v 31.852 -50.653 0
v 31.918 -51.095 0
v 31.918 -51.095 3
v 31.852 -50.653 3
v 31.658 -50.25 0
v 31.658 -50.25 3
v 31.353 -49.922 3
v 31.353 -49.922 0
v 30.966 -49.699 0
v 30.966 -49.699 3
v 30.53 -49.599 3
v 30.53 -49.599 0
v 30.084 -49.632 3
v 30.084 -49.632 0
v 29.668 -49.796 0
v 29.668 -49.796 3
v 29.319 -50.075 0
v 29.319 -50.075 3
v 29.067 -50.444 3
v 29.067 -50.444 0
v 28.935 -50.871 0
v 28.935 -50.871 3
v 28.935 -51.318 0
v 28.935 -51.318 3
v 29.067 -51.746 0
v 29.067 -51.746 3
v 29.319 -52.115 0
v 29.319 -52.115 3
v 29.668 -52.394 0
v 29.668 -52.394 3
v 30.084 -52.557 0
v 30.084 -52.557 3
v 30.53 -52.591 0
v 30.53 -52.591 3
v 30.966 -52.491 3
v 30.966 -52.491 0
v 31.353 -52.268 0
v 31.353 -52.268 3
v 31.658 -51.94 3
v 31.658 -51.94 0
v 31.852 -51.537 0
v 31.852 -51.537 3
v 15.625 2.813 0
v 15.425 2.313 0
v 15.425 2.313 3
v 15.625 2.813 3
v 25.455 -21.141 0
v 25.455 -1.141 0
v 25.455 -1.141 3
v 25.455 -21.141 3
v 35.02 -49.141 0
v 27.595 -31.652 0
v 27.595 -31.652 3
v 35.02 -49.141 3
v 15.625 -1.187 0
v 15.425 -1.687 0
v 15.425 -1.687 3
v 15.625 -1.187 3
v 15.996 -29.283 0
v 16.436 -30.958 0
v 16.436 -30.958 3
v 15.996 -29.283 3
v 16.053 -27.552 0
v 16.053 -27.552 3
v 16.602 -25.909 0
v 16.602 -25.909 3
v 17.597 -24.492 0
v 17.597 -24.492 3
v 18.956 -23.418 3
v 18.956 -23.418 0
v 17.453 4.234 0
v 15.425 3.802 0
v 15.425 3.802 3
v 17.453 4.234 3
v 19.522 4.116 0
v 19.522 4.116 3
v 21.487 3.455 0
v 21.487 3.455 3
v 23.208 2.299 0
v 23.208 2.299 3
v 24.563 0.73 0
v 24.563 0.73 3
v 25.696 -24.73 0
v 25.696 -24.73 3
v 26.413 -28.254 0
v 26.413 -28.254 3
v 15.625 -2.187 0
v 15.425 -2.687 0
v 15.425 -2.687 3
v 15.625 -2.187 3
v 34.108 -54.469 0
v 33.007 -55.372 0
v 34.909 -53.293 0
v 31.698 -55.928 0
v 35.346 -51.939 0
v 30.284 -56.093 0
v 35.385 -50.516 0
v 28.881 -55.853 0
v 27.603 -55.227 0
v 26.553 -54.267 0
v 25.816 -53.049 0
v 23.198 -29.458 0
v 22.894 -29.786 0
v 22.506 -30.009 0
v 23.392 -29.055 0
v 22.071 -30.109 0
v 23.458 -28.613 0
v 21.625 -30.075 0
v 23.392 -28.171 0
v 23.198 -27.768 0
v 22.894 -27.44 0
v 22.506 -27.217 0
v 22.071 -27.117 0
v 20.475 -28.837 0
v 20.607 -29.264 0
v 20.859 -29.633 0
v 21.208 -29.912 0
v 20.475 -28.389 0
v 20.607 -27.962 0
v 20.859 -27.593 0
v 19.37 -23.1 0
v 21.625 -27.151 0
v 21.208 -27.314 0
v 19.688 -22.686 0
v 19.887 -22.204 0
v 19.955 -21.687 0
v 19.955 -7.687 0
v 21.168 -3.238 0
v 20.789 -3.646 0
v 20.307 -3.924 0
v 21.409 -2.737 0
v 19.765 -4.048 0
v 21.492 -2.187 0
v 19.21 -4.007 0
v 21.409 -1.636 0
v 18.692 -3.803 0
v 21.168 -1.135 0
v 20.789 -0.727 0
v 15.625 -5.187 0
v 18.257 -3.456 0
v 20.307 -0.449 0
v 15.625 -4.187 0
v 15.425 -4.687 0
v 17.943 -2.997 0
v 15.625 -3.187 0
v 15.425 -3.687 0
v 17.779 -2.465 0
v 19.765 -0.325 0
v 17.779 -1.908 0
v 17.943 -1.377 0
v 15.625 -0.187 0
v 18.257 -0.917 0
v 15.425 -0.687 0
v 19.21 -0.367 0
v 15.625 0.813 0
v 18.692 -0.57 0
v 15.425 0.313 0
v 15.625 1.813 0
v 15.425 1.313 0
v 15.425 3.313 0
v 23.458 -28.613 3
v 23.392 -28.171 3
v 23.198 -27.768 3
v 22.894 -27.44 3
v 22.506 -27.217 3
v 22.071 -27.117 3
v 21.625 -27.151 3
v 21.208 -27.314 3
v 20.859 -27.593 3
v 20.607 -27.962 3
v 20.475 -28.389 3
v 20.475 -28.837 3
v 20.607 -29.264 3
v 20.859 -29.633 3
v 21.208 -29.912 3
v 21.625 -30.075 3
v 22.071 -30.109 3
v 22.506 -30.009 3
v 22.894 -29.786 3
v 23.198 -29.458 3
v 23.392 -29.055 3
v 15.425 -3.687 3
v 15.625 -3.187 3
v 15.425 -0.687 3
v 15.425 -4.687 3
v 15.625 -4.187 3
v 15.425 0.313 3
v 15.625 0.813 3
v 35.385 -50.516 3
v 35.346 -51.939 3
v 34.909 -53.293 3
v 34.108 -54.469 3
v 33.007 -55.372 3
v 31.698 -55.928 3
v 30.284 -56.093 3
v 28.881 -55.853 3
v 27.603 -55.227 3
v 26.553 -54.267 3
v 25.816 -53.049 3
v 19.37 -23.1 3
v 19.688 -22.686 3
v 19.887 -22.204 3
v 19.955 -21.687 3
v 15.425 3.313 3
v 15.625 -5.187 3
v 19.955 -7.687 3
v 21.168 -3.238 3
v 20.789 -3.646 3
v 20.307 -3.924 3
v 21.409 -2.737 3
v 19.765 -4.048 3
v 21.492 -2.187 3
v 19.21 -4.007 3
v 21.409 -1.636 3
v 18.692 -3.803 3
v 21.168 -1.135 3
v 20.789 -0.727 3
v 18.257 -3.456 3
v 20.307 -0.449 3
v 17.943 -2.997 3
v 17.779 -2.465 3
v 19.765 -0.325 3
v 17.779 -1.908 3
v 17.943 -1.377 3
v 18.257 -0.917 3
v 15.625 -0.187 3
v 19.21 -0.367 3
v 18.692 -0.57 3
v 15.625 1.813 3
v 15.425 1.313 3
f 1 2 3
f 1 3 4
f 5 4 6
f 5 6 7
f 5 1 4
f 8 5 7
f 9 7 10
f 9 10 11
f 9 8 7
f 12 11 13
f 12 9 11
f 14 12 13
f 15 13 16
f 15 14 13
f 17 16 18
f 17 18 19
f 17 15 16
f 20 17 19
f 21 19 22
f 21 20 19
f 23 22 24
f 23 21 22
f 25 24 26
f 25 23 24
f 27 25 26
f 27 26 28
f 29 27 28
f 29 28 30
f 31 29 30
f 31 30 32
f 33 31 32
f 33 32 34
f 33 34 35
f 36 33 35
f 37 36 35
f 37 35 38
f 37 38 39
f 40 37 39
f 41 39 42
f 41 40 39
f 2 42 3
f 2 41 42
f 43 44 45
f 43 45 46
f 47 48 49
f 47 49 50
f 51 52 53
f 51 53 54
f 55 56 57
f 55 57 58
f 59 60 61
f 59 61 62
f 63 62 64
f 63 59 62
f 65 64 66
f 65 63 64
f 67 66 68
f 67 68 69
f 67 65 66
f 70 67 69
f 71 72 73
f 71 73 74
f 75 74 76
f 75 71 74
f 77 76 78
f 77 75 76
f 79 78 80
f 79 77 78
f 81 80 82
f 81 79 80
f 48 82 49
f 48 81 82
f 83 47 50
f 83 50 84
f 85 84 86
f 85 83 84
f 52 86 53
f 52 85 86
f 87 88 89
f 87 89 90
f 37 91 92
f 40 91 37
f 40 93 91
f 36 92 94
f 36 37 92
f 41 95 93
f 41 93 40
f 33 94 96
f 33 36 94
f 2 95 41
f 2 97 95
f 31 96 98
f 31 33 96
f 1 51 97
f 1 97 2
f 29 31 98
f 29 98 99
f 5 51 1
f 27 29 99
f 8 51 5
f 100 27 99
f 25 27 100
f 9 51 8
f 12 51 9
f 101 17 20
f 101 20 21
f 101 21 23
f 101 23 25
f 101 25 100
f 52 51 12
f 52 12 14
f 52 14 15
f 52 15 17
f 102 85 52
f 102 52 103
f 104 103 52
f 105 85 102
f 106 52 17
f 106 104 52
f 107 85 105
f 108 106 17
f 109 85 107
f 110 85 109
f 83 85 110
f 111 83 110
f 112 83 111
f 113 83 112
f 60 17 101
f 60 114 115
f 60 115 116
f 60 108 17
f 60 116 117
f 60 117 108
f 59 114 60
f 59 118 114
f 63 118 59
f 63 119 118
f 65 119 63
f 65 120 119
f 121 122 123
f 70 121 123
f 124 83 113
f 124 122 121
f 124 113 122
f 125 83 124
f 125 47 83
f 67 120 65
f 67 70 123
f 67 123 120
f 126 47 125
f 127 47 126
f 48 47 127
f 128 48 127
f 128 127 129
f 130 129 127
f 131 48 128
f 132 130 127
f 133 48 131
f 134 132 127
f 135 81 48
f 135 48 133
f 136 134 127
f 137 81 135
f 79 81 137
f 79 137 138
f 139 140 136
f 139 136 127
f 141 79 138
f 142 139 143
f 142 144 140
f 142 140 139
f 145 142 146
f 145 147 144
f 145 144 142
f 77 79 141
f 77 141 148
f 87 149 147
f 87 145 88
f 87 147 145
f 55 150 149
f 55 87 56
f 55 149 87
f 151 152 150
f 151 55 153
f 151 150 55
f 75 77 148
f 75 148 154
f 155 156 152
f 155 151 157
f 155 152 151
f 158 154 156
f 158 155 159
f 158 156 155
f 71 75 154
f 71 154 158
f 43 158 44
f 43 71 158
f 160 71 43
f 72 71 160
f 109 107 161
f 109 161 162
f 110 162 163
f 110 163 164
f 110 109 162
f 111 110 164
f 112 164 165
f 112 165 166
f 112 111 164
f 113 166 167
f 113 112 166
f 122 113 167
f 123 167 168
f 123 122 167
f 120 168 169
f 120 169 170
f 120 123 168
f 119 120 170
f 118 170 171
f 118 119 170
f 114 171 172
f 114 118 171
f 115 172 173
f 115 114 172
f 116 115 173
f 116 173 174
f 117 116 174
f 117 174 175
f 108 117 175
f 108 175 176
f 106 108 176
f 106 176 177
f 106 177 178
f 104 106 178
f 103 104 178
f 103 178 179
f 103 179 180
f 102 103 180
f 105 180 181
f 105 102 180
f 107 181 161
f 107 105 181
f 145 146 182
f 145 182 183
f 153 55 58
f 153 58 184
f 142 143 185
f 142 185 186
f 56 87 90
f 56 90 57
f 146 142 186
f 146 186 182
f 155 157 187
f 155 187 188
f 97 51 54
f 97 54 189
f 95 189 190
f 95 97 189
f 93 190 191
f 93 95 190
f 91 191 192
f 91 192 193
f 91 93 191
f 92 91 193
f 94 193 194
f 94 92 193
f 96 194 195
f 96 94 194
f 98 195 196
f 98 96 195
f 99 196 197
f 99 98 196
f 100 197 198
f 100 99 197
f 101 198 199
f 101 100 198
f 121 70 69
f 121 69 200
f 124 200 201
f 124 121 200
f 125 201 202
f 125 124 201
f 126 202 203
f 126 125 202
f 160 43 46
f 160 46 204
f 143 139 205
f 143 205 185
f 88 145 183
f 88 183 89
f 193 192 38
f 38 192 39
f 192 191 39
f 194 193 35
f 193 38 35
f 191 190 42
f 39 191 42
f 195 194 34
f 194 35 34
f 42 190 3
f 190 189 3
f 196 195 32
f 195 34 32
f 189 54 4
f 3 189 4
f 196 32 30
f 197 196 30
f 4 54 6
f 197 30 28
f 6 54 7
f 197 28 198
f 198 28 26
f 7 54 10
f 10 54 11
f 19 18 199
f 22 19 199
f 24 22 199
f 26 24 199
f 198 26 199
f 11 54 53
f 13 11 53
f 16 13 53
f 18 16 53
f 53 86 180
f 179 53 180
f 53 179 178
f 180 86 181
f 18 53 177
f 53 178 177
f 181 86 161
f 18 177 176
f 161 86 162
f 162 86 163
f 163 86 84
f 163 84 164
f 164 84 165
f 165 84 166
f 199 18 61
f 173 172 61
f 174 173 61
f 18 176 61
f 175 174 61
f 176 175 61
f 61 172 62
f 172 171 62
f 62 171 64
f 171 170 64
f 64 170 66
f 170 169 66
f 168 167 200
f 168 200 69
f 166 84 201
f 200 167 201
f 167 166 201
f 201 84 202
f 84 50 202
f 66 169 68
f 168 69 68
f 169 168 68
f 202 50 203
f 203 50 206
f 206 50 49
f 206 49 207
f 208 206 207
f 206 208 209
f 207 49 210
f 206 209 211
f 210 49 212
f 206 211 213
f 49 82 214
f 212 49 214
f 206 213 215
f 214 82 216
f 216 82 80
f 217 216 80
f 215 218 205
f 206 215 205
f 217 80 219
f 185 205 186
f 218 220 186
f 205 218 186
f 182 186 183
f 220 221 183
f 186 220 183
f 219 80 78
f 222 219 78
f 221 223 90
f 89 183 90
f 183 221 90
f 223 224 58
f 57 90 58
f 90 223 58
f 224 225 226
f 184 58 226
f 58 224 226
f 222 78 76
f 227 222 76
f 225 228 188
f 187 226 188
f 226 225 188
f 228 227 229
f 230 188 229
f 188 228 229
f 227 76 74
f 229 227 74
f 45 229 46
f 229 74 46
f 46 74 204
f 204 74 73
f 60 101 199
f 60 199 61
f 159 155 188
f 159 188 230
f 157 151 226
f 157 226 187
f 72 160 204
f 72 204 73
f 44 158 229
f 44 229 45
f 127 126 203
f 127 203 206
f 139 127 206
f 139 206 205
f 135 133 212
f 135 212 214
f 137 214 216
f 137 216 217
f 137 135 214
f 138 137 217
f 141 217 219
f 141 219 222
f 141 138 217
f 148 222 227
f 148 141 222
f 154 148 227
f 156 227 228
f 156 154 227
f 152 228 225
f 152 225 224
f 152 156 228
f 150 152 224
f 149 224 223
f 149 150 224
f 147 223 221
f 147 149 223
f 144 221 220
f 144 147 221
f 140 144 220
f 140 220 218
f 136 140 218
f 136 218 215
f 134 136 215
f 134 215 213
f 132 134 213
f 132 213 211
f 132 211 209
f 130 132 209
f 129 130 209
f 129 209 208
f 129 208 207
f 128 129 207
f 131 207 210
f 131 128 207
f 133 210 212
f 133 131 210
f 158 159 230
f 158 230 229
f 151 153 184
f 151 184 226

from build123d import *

# Parameters (mm, degrees)
SKETCH1_R           = 1.5
SKETCH1_R_2         = 1.866773139
BOSS_EXTRUDE2_DEPTH = 3


with BuildPart() as part:
    # Sketch1 → Boss-Extrude2 (new body)
    with BuildSketch(Plane.XY):
        with BuildLine():
            Line((19.955328479, -21.686654411), (19.955328479, -7.686654411))
            Line((19.955328479, -7.686654411), (15.62520146, -5.186654411))
            Line((15.62520146, -5.186654411), (15.42520146, -4.686654411))
            Line((15.42520146, -4.686654411), (15.62520146, -4.186654411))
            Line((15.62520146, -4.186654411), (15.42520146, -3.686654411))
            Line((15.42520146, -3.686654411), (15.62520146, -3.186654411))
            Line((15.62520146, -3.186654411), (15.42520146, -2.686654411))
            Line((15.42520146, -2.686654411), (15.62520146, -2.186654411))
            Line((15.62520146, -2.186654411), (15.42520146, -1.686654411))
            Line((15.42520146, -1.686654411), (15.62520146, -1.186654411))
            Line((15.62520146, -1.186654411), (15.42520146, -0.686654411))
            Line((15.42520146, -0.686654411), (15.62520146, -0.186654411))
            Line((15.62520146, -0.186654411), (15.42520146, 0.313345589))
            Line((15.42520146, 0.313345589), (15.62520146, 0.813345589))
            Line((15.62520146, 0.813345589), (15.42520146, 1.313345589))
            Line((15.42520146, 1.313345589), (15.62520146, 1.813345589))
            Line((15.62520146, 1.813345589), (15.42520146, 2.313345589))
            Line((15.42520146, 2.313345589), (15.62520146, 2.813345589))
            Line((15.62520146, 2.813345589), (15.42520146, 3.313345589))
            Line((15.42520146, 3.313345589), (15.42520146, 3.802153535))
            ThreePointArc((15.42520146, 3.802153535), (21.487107687, 3.455011814), (25.455328479, -1.140685983))
            Line((25.455328479, -1.140685983), (25.455328479, -21.140685983))
            ThreePointArc((25.455328479, -21.140685983), (25.995551768, -26.504062064), (27.594518651, -31.651969317))
            Line((27.594518651, -31.651969317), (35.020472422, -49.140685983))
            ThreePointArc((35.020472422, -49.140685983), (32.372376923, -55.697178203), (25.815884703, -53.049082704))
            Line((25.815884703, -53.049082704), (16.435732572, -30.958072179))
            ThreePointArc((16.435732572, -30.958072179), (16.267997475, -26.710838203), (18.95611766, -23.418249345))
            ThreePointArc((18.95611766, -23.418249345), (19.687607088, -22.686259743), (19.955328479, -21.686654411))
        make_face()
        with Locations((30.418178563, -51.094884343)):
            Circle(SKETCH1_R, mode=Mode.SUBTRACT)
        with Locations((19.62520146, -2.186654411)):
            Circle(SKETCH1_R_2, mode=Mode.SUBTRACT)
        with Locations((21.958485203, -28.613034147)):
            Circle(SKETCH1_R, mode=Mode.SUBTRACT)
    extrude(amount=BOSS_EXTRUDE2_DEPTH)


solid = part.part
